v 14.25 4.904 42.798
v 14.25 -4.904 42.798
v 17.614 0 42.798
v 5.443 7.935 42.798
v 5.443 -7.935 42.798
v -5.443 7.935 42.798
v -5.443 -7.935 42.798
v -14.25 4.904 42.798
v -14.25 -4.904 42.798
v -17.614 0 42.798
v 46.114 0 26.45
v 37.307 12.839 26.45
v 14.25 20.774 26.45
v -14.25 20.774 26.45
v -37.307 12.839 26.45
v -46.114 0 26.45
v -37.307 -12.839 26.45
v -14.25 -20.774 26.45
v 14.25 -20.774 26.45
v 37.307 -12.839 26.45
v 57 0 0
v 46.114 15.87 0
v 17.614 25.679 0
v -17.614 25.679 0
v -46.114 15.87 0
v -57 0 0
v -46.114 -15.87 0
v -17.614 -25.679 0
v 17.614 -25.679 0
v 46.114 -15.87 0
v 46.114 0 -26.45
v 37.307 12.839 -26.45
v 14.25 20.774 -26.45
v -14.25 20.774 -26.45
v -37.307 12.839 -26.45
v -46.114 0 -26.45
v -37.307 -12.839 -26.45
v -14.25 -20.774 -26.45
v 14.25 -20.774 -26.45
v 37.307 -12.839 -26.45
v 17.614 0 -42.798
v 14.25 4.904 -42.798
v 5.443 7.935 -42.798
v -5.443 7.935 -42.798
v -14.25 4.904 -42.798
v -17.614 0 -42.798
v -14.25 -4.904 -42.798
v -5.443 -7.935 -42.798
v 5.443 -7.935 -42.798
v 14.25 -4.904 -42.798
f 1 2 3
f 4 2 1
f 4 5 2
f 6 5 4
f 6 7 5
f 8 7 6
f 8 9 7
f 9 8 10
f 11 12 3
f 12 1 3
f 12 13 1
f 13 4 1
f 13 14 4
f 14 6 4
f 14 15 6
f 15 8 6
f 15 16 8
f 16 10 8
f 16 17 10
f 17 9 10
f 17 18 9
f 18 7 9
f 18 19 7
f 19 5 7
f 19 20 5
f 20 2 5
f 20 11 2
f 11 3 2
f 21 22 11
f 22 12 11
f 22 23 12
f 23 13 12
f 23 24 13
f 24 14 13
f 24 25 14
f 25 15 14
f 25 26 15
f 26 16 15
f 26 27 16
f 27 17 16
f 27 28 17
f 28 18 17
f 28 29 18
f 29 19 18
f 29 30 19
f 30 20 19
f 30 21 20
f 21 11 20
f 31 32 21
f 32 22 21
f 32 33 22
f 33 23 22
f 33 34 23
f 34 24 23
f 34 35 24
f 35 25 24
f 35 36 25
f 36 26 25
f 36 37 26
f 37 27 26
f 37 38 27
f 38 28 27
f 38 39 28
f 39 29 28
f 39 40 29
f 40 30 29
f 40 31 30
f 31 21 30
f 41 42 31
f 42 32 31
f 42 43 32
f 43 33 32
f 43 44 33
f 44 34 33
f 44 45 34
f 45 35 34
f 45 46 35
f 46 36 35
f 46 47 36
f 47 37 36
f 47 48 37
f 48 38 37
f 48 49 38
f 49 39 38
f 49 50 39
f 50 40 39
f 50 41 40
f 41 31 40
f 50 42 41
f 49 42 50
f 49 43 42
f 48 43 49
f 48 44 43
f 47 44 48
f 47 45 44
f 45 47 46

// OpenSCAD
// Generated by SolidPython 1.0.1 on 2020-07-29 00:46:54


scale(v = [19, 9, 15]) {
	sphere(r = 3);
}
/***********************************************
*********      SolidPython code:      **********
************************************************
 
# import packages: SolidPython
from solid import *
from solid.utils import *
from itertools import chain, combinations, permutations


class Resize:

    def __init__(self, scad_file):
        self.scad_file = scad_file
        #self.scad_file = import_scad(scad_file)
        # cone/cylinder param:
        self.r1 = 0
        self.r2 = 0
        self.h = 0
        # rectangular prism param:
        self.w = 0
        self.l = 0
        # ellipse param:
        self.r = 0

    # import OpenScad code (file name corresponds to shape)


    # classify shape + parameters
    def assign(self, param1, param2, param3):
        if self.scad_file == 'cone.scad':
            self.r1 = param1
            self.r2 = param2
            self.h = param3
        elif self.scad_file == 'cylinder.scad':
            self.r1 = param1
            self.r2 = param2
            self.h = param3
        elif self.scad_file == 'rectangularPrism.scad':
            self.h = param1
            self.l = param2
            self.w = param3
        else:
            self.r = param1
            self.h = param2

    # resize parameters
    def iterate(self):
        x = range(3, 20, 2)
        i = 1
        if self.scad_file == 'cone.scad':
            tempList = list(permutations(x, 2))
            for temp in tempList:
                param1 = temp[0]
                param2 = temp[1]
                filepath = 'produced_scad_files/' + 'cone' + str(param1) + '_' + str(param2) + '_' + '.scad'
                scad_render_to_file(cylinder(h=param1, r1=param2, r2=0), filepath)

        elif self.scad_file == 'cylinder.scad':
            tempList = list(permutations(x, 3))
            for temp in tempList:
                param1 = temp[0]
                param2 = temp[1]
                filepath = 'produced_scad_files/' + 'cylinder' + str(param1) + '_' + str(param2) + '_' + '.scad'
                scad_render_to_file(cylinder(h=param1, r1=param2, r2=param2), filepath)

        elif self.scad_file == 'rectangularPrism.scad':
            tempList = list(permutations(x, 3))
            for temp in tempList:
                param1 = temp[0]
                param2 = temp[1]
                param3 = temp[2]
                filepath = 'produced_scad_files/' + 'rectangularPrism' + str(param1) + '_' + str(param2) + '_' + str(
                    param3) + '.scad'
                scad_render_to_file(cube(size=(param1, param2, param3)), filepath)

        elif self.scad_file == 'ellipse.scad':
            tempList = list(permutations(x, 4))
            for temp in tempList:
                param1 = temp[0]
                param2 = temp[1]
                param3 = temp[2]
                param4 = temp[3]
                filepath = 'produced_scad_files/' + 'ellipse' + str(param1) + '_' + str(param2) + '_' + str(param3) + '_' + str(param4) + '.scad'
                scad_render_to_file(scale([param1, param2, param3])(sphere(r=param4)), filepath)

    def render_to_scadfile(self):
        scad_render_to_file(scad, 'example.scad') 
 
************************************************/
